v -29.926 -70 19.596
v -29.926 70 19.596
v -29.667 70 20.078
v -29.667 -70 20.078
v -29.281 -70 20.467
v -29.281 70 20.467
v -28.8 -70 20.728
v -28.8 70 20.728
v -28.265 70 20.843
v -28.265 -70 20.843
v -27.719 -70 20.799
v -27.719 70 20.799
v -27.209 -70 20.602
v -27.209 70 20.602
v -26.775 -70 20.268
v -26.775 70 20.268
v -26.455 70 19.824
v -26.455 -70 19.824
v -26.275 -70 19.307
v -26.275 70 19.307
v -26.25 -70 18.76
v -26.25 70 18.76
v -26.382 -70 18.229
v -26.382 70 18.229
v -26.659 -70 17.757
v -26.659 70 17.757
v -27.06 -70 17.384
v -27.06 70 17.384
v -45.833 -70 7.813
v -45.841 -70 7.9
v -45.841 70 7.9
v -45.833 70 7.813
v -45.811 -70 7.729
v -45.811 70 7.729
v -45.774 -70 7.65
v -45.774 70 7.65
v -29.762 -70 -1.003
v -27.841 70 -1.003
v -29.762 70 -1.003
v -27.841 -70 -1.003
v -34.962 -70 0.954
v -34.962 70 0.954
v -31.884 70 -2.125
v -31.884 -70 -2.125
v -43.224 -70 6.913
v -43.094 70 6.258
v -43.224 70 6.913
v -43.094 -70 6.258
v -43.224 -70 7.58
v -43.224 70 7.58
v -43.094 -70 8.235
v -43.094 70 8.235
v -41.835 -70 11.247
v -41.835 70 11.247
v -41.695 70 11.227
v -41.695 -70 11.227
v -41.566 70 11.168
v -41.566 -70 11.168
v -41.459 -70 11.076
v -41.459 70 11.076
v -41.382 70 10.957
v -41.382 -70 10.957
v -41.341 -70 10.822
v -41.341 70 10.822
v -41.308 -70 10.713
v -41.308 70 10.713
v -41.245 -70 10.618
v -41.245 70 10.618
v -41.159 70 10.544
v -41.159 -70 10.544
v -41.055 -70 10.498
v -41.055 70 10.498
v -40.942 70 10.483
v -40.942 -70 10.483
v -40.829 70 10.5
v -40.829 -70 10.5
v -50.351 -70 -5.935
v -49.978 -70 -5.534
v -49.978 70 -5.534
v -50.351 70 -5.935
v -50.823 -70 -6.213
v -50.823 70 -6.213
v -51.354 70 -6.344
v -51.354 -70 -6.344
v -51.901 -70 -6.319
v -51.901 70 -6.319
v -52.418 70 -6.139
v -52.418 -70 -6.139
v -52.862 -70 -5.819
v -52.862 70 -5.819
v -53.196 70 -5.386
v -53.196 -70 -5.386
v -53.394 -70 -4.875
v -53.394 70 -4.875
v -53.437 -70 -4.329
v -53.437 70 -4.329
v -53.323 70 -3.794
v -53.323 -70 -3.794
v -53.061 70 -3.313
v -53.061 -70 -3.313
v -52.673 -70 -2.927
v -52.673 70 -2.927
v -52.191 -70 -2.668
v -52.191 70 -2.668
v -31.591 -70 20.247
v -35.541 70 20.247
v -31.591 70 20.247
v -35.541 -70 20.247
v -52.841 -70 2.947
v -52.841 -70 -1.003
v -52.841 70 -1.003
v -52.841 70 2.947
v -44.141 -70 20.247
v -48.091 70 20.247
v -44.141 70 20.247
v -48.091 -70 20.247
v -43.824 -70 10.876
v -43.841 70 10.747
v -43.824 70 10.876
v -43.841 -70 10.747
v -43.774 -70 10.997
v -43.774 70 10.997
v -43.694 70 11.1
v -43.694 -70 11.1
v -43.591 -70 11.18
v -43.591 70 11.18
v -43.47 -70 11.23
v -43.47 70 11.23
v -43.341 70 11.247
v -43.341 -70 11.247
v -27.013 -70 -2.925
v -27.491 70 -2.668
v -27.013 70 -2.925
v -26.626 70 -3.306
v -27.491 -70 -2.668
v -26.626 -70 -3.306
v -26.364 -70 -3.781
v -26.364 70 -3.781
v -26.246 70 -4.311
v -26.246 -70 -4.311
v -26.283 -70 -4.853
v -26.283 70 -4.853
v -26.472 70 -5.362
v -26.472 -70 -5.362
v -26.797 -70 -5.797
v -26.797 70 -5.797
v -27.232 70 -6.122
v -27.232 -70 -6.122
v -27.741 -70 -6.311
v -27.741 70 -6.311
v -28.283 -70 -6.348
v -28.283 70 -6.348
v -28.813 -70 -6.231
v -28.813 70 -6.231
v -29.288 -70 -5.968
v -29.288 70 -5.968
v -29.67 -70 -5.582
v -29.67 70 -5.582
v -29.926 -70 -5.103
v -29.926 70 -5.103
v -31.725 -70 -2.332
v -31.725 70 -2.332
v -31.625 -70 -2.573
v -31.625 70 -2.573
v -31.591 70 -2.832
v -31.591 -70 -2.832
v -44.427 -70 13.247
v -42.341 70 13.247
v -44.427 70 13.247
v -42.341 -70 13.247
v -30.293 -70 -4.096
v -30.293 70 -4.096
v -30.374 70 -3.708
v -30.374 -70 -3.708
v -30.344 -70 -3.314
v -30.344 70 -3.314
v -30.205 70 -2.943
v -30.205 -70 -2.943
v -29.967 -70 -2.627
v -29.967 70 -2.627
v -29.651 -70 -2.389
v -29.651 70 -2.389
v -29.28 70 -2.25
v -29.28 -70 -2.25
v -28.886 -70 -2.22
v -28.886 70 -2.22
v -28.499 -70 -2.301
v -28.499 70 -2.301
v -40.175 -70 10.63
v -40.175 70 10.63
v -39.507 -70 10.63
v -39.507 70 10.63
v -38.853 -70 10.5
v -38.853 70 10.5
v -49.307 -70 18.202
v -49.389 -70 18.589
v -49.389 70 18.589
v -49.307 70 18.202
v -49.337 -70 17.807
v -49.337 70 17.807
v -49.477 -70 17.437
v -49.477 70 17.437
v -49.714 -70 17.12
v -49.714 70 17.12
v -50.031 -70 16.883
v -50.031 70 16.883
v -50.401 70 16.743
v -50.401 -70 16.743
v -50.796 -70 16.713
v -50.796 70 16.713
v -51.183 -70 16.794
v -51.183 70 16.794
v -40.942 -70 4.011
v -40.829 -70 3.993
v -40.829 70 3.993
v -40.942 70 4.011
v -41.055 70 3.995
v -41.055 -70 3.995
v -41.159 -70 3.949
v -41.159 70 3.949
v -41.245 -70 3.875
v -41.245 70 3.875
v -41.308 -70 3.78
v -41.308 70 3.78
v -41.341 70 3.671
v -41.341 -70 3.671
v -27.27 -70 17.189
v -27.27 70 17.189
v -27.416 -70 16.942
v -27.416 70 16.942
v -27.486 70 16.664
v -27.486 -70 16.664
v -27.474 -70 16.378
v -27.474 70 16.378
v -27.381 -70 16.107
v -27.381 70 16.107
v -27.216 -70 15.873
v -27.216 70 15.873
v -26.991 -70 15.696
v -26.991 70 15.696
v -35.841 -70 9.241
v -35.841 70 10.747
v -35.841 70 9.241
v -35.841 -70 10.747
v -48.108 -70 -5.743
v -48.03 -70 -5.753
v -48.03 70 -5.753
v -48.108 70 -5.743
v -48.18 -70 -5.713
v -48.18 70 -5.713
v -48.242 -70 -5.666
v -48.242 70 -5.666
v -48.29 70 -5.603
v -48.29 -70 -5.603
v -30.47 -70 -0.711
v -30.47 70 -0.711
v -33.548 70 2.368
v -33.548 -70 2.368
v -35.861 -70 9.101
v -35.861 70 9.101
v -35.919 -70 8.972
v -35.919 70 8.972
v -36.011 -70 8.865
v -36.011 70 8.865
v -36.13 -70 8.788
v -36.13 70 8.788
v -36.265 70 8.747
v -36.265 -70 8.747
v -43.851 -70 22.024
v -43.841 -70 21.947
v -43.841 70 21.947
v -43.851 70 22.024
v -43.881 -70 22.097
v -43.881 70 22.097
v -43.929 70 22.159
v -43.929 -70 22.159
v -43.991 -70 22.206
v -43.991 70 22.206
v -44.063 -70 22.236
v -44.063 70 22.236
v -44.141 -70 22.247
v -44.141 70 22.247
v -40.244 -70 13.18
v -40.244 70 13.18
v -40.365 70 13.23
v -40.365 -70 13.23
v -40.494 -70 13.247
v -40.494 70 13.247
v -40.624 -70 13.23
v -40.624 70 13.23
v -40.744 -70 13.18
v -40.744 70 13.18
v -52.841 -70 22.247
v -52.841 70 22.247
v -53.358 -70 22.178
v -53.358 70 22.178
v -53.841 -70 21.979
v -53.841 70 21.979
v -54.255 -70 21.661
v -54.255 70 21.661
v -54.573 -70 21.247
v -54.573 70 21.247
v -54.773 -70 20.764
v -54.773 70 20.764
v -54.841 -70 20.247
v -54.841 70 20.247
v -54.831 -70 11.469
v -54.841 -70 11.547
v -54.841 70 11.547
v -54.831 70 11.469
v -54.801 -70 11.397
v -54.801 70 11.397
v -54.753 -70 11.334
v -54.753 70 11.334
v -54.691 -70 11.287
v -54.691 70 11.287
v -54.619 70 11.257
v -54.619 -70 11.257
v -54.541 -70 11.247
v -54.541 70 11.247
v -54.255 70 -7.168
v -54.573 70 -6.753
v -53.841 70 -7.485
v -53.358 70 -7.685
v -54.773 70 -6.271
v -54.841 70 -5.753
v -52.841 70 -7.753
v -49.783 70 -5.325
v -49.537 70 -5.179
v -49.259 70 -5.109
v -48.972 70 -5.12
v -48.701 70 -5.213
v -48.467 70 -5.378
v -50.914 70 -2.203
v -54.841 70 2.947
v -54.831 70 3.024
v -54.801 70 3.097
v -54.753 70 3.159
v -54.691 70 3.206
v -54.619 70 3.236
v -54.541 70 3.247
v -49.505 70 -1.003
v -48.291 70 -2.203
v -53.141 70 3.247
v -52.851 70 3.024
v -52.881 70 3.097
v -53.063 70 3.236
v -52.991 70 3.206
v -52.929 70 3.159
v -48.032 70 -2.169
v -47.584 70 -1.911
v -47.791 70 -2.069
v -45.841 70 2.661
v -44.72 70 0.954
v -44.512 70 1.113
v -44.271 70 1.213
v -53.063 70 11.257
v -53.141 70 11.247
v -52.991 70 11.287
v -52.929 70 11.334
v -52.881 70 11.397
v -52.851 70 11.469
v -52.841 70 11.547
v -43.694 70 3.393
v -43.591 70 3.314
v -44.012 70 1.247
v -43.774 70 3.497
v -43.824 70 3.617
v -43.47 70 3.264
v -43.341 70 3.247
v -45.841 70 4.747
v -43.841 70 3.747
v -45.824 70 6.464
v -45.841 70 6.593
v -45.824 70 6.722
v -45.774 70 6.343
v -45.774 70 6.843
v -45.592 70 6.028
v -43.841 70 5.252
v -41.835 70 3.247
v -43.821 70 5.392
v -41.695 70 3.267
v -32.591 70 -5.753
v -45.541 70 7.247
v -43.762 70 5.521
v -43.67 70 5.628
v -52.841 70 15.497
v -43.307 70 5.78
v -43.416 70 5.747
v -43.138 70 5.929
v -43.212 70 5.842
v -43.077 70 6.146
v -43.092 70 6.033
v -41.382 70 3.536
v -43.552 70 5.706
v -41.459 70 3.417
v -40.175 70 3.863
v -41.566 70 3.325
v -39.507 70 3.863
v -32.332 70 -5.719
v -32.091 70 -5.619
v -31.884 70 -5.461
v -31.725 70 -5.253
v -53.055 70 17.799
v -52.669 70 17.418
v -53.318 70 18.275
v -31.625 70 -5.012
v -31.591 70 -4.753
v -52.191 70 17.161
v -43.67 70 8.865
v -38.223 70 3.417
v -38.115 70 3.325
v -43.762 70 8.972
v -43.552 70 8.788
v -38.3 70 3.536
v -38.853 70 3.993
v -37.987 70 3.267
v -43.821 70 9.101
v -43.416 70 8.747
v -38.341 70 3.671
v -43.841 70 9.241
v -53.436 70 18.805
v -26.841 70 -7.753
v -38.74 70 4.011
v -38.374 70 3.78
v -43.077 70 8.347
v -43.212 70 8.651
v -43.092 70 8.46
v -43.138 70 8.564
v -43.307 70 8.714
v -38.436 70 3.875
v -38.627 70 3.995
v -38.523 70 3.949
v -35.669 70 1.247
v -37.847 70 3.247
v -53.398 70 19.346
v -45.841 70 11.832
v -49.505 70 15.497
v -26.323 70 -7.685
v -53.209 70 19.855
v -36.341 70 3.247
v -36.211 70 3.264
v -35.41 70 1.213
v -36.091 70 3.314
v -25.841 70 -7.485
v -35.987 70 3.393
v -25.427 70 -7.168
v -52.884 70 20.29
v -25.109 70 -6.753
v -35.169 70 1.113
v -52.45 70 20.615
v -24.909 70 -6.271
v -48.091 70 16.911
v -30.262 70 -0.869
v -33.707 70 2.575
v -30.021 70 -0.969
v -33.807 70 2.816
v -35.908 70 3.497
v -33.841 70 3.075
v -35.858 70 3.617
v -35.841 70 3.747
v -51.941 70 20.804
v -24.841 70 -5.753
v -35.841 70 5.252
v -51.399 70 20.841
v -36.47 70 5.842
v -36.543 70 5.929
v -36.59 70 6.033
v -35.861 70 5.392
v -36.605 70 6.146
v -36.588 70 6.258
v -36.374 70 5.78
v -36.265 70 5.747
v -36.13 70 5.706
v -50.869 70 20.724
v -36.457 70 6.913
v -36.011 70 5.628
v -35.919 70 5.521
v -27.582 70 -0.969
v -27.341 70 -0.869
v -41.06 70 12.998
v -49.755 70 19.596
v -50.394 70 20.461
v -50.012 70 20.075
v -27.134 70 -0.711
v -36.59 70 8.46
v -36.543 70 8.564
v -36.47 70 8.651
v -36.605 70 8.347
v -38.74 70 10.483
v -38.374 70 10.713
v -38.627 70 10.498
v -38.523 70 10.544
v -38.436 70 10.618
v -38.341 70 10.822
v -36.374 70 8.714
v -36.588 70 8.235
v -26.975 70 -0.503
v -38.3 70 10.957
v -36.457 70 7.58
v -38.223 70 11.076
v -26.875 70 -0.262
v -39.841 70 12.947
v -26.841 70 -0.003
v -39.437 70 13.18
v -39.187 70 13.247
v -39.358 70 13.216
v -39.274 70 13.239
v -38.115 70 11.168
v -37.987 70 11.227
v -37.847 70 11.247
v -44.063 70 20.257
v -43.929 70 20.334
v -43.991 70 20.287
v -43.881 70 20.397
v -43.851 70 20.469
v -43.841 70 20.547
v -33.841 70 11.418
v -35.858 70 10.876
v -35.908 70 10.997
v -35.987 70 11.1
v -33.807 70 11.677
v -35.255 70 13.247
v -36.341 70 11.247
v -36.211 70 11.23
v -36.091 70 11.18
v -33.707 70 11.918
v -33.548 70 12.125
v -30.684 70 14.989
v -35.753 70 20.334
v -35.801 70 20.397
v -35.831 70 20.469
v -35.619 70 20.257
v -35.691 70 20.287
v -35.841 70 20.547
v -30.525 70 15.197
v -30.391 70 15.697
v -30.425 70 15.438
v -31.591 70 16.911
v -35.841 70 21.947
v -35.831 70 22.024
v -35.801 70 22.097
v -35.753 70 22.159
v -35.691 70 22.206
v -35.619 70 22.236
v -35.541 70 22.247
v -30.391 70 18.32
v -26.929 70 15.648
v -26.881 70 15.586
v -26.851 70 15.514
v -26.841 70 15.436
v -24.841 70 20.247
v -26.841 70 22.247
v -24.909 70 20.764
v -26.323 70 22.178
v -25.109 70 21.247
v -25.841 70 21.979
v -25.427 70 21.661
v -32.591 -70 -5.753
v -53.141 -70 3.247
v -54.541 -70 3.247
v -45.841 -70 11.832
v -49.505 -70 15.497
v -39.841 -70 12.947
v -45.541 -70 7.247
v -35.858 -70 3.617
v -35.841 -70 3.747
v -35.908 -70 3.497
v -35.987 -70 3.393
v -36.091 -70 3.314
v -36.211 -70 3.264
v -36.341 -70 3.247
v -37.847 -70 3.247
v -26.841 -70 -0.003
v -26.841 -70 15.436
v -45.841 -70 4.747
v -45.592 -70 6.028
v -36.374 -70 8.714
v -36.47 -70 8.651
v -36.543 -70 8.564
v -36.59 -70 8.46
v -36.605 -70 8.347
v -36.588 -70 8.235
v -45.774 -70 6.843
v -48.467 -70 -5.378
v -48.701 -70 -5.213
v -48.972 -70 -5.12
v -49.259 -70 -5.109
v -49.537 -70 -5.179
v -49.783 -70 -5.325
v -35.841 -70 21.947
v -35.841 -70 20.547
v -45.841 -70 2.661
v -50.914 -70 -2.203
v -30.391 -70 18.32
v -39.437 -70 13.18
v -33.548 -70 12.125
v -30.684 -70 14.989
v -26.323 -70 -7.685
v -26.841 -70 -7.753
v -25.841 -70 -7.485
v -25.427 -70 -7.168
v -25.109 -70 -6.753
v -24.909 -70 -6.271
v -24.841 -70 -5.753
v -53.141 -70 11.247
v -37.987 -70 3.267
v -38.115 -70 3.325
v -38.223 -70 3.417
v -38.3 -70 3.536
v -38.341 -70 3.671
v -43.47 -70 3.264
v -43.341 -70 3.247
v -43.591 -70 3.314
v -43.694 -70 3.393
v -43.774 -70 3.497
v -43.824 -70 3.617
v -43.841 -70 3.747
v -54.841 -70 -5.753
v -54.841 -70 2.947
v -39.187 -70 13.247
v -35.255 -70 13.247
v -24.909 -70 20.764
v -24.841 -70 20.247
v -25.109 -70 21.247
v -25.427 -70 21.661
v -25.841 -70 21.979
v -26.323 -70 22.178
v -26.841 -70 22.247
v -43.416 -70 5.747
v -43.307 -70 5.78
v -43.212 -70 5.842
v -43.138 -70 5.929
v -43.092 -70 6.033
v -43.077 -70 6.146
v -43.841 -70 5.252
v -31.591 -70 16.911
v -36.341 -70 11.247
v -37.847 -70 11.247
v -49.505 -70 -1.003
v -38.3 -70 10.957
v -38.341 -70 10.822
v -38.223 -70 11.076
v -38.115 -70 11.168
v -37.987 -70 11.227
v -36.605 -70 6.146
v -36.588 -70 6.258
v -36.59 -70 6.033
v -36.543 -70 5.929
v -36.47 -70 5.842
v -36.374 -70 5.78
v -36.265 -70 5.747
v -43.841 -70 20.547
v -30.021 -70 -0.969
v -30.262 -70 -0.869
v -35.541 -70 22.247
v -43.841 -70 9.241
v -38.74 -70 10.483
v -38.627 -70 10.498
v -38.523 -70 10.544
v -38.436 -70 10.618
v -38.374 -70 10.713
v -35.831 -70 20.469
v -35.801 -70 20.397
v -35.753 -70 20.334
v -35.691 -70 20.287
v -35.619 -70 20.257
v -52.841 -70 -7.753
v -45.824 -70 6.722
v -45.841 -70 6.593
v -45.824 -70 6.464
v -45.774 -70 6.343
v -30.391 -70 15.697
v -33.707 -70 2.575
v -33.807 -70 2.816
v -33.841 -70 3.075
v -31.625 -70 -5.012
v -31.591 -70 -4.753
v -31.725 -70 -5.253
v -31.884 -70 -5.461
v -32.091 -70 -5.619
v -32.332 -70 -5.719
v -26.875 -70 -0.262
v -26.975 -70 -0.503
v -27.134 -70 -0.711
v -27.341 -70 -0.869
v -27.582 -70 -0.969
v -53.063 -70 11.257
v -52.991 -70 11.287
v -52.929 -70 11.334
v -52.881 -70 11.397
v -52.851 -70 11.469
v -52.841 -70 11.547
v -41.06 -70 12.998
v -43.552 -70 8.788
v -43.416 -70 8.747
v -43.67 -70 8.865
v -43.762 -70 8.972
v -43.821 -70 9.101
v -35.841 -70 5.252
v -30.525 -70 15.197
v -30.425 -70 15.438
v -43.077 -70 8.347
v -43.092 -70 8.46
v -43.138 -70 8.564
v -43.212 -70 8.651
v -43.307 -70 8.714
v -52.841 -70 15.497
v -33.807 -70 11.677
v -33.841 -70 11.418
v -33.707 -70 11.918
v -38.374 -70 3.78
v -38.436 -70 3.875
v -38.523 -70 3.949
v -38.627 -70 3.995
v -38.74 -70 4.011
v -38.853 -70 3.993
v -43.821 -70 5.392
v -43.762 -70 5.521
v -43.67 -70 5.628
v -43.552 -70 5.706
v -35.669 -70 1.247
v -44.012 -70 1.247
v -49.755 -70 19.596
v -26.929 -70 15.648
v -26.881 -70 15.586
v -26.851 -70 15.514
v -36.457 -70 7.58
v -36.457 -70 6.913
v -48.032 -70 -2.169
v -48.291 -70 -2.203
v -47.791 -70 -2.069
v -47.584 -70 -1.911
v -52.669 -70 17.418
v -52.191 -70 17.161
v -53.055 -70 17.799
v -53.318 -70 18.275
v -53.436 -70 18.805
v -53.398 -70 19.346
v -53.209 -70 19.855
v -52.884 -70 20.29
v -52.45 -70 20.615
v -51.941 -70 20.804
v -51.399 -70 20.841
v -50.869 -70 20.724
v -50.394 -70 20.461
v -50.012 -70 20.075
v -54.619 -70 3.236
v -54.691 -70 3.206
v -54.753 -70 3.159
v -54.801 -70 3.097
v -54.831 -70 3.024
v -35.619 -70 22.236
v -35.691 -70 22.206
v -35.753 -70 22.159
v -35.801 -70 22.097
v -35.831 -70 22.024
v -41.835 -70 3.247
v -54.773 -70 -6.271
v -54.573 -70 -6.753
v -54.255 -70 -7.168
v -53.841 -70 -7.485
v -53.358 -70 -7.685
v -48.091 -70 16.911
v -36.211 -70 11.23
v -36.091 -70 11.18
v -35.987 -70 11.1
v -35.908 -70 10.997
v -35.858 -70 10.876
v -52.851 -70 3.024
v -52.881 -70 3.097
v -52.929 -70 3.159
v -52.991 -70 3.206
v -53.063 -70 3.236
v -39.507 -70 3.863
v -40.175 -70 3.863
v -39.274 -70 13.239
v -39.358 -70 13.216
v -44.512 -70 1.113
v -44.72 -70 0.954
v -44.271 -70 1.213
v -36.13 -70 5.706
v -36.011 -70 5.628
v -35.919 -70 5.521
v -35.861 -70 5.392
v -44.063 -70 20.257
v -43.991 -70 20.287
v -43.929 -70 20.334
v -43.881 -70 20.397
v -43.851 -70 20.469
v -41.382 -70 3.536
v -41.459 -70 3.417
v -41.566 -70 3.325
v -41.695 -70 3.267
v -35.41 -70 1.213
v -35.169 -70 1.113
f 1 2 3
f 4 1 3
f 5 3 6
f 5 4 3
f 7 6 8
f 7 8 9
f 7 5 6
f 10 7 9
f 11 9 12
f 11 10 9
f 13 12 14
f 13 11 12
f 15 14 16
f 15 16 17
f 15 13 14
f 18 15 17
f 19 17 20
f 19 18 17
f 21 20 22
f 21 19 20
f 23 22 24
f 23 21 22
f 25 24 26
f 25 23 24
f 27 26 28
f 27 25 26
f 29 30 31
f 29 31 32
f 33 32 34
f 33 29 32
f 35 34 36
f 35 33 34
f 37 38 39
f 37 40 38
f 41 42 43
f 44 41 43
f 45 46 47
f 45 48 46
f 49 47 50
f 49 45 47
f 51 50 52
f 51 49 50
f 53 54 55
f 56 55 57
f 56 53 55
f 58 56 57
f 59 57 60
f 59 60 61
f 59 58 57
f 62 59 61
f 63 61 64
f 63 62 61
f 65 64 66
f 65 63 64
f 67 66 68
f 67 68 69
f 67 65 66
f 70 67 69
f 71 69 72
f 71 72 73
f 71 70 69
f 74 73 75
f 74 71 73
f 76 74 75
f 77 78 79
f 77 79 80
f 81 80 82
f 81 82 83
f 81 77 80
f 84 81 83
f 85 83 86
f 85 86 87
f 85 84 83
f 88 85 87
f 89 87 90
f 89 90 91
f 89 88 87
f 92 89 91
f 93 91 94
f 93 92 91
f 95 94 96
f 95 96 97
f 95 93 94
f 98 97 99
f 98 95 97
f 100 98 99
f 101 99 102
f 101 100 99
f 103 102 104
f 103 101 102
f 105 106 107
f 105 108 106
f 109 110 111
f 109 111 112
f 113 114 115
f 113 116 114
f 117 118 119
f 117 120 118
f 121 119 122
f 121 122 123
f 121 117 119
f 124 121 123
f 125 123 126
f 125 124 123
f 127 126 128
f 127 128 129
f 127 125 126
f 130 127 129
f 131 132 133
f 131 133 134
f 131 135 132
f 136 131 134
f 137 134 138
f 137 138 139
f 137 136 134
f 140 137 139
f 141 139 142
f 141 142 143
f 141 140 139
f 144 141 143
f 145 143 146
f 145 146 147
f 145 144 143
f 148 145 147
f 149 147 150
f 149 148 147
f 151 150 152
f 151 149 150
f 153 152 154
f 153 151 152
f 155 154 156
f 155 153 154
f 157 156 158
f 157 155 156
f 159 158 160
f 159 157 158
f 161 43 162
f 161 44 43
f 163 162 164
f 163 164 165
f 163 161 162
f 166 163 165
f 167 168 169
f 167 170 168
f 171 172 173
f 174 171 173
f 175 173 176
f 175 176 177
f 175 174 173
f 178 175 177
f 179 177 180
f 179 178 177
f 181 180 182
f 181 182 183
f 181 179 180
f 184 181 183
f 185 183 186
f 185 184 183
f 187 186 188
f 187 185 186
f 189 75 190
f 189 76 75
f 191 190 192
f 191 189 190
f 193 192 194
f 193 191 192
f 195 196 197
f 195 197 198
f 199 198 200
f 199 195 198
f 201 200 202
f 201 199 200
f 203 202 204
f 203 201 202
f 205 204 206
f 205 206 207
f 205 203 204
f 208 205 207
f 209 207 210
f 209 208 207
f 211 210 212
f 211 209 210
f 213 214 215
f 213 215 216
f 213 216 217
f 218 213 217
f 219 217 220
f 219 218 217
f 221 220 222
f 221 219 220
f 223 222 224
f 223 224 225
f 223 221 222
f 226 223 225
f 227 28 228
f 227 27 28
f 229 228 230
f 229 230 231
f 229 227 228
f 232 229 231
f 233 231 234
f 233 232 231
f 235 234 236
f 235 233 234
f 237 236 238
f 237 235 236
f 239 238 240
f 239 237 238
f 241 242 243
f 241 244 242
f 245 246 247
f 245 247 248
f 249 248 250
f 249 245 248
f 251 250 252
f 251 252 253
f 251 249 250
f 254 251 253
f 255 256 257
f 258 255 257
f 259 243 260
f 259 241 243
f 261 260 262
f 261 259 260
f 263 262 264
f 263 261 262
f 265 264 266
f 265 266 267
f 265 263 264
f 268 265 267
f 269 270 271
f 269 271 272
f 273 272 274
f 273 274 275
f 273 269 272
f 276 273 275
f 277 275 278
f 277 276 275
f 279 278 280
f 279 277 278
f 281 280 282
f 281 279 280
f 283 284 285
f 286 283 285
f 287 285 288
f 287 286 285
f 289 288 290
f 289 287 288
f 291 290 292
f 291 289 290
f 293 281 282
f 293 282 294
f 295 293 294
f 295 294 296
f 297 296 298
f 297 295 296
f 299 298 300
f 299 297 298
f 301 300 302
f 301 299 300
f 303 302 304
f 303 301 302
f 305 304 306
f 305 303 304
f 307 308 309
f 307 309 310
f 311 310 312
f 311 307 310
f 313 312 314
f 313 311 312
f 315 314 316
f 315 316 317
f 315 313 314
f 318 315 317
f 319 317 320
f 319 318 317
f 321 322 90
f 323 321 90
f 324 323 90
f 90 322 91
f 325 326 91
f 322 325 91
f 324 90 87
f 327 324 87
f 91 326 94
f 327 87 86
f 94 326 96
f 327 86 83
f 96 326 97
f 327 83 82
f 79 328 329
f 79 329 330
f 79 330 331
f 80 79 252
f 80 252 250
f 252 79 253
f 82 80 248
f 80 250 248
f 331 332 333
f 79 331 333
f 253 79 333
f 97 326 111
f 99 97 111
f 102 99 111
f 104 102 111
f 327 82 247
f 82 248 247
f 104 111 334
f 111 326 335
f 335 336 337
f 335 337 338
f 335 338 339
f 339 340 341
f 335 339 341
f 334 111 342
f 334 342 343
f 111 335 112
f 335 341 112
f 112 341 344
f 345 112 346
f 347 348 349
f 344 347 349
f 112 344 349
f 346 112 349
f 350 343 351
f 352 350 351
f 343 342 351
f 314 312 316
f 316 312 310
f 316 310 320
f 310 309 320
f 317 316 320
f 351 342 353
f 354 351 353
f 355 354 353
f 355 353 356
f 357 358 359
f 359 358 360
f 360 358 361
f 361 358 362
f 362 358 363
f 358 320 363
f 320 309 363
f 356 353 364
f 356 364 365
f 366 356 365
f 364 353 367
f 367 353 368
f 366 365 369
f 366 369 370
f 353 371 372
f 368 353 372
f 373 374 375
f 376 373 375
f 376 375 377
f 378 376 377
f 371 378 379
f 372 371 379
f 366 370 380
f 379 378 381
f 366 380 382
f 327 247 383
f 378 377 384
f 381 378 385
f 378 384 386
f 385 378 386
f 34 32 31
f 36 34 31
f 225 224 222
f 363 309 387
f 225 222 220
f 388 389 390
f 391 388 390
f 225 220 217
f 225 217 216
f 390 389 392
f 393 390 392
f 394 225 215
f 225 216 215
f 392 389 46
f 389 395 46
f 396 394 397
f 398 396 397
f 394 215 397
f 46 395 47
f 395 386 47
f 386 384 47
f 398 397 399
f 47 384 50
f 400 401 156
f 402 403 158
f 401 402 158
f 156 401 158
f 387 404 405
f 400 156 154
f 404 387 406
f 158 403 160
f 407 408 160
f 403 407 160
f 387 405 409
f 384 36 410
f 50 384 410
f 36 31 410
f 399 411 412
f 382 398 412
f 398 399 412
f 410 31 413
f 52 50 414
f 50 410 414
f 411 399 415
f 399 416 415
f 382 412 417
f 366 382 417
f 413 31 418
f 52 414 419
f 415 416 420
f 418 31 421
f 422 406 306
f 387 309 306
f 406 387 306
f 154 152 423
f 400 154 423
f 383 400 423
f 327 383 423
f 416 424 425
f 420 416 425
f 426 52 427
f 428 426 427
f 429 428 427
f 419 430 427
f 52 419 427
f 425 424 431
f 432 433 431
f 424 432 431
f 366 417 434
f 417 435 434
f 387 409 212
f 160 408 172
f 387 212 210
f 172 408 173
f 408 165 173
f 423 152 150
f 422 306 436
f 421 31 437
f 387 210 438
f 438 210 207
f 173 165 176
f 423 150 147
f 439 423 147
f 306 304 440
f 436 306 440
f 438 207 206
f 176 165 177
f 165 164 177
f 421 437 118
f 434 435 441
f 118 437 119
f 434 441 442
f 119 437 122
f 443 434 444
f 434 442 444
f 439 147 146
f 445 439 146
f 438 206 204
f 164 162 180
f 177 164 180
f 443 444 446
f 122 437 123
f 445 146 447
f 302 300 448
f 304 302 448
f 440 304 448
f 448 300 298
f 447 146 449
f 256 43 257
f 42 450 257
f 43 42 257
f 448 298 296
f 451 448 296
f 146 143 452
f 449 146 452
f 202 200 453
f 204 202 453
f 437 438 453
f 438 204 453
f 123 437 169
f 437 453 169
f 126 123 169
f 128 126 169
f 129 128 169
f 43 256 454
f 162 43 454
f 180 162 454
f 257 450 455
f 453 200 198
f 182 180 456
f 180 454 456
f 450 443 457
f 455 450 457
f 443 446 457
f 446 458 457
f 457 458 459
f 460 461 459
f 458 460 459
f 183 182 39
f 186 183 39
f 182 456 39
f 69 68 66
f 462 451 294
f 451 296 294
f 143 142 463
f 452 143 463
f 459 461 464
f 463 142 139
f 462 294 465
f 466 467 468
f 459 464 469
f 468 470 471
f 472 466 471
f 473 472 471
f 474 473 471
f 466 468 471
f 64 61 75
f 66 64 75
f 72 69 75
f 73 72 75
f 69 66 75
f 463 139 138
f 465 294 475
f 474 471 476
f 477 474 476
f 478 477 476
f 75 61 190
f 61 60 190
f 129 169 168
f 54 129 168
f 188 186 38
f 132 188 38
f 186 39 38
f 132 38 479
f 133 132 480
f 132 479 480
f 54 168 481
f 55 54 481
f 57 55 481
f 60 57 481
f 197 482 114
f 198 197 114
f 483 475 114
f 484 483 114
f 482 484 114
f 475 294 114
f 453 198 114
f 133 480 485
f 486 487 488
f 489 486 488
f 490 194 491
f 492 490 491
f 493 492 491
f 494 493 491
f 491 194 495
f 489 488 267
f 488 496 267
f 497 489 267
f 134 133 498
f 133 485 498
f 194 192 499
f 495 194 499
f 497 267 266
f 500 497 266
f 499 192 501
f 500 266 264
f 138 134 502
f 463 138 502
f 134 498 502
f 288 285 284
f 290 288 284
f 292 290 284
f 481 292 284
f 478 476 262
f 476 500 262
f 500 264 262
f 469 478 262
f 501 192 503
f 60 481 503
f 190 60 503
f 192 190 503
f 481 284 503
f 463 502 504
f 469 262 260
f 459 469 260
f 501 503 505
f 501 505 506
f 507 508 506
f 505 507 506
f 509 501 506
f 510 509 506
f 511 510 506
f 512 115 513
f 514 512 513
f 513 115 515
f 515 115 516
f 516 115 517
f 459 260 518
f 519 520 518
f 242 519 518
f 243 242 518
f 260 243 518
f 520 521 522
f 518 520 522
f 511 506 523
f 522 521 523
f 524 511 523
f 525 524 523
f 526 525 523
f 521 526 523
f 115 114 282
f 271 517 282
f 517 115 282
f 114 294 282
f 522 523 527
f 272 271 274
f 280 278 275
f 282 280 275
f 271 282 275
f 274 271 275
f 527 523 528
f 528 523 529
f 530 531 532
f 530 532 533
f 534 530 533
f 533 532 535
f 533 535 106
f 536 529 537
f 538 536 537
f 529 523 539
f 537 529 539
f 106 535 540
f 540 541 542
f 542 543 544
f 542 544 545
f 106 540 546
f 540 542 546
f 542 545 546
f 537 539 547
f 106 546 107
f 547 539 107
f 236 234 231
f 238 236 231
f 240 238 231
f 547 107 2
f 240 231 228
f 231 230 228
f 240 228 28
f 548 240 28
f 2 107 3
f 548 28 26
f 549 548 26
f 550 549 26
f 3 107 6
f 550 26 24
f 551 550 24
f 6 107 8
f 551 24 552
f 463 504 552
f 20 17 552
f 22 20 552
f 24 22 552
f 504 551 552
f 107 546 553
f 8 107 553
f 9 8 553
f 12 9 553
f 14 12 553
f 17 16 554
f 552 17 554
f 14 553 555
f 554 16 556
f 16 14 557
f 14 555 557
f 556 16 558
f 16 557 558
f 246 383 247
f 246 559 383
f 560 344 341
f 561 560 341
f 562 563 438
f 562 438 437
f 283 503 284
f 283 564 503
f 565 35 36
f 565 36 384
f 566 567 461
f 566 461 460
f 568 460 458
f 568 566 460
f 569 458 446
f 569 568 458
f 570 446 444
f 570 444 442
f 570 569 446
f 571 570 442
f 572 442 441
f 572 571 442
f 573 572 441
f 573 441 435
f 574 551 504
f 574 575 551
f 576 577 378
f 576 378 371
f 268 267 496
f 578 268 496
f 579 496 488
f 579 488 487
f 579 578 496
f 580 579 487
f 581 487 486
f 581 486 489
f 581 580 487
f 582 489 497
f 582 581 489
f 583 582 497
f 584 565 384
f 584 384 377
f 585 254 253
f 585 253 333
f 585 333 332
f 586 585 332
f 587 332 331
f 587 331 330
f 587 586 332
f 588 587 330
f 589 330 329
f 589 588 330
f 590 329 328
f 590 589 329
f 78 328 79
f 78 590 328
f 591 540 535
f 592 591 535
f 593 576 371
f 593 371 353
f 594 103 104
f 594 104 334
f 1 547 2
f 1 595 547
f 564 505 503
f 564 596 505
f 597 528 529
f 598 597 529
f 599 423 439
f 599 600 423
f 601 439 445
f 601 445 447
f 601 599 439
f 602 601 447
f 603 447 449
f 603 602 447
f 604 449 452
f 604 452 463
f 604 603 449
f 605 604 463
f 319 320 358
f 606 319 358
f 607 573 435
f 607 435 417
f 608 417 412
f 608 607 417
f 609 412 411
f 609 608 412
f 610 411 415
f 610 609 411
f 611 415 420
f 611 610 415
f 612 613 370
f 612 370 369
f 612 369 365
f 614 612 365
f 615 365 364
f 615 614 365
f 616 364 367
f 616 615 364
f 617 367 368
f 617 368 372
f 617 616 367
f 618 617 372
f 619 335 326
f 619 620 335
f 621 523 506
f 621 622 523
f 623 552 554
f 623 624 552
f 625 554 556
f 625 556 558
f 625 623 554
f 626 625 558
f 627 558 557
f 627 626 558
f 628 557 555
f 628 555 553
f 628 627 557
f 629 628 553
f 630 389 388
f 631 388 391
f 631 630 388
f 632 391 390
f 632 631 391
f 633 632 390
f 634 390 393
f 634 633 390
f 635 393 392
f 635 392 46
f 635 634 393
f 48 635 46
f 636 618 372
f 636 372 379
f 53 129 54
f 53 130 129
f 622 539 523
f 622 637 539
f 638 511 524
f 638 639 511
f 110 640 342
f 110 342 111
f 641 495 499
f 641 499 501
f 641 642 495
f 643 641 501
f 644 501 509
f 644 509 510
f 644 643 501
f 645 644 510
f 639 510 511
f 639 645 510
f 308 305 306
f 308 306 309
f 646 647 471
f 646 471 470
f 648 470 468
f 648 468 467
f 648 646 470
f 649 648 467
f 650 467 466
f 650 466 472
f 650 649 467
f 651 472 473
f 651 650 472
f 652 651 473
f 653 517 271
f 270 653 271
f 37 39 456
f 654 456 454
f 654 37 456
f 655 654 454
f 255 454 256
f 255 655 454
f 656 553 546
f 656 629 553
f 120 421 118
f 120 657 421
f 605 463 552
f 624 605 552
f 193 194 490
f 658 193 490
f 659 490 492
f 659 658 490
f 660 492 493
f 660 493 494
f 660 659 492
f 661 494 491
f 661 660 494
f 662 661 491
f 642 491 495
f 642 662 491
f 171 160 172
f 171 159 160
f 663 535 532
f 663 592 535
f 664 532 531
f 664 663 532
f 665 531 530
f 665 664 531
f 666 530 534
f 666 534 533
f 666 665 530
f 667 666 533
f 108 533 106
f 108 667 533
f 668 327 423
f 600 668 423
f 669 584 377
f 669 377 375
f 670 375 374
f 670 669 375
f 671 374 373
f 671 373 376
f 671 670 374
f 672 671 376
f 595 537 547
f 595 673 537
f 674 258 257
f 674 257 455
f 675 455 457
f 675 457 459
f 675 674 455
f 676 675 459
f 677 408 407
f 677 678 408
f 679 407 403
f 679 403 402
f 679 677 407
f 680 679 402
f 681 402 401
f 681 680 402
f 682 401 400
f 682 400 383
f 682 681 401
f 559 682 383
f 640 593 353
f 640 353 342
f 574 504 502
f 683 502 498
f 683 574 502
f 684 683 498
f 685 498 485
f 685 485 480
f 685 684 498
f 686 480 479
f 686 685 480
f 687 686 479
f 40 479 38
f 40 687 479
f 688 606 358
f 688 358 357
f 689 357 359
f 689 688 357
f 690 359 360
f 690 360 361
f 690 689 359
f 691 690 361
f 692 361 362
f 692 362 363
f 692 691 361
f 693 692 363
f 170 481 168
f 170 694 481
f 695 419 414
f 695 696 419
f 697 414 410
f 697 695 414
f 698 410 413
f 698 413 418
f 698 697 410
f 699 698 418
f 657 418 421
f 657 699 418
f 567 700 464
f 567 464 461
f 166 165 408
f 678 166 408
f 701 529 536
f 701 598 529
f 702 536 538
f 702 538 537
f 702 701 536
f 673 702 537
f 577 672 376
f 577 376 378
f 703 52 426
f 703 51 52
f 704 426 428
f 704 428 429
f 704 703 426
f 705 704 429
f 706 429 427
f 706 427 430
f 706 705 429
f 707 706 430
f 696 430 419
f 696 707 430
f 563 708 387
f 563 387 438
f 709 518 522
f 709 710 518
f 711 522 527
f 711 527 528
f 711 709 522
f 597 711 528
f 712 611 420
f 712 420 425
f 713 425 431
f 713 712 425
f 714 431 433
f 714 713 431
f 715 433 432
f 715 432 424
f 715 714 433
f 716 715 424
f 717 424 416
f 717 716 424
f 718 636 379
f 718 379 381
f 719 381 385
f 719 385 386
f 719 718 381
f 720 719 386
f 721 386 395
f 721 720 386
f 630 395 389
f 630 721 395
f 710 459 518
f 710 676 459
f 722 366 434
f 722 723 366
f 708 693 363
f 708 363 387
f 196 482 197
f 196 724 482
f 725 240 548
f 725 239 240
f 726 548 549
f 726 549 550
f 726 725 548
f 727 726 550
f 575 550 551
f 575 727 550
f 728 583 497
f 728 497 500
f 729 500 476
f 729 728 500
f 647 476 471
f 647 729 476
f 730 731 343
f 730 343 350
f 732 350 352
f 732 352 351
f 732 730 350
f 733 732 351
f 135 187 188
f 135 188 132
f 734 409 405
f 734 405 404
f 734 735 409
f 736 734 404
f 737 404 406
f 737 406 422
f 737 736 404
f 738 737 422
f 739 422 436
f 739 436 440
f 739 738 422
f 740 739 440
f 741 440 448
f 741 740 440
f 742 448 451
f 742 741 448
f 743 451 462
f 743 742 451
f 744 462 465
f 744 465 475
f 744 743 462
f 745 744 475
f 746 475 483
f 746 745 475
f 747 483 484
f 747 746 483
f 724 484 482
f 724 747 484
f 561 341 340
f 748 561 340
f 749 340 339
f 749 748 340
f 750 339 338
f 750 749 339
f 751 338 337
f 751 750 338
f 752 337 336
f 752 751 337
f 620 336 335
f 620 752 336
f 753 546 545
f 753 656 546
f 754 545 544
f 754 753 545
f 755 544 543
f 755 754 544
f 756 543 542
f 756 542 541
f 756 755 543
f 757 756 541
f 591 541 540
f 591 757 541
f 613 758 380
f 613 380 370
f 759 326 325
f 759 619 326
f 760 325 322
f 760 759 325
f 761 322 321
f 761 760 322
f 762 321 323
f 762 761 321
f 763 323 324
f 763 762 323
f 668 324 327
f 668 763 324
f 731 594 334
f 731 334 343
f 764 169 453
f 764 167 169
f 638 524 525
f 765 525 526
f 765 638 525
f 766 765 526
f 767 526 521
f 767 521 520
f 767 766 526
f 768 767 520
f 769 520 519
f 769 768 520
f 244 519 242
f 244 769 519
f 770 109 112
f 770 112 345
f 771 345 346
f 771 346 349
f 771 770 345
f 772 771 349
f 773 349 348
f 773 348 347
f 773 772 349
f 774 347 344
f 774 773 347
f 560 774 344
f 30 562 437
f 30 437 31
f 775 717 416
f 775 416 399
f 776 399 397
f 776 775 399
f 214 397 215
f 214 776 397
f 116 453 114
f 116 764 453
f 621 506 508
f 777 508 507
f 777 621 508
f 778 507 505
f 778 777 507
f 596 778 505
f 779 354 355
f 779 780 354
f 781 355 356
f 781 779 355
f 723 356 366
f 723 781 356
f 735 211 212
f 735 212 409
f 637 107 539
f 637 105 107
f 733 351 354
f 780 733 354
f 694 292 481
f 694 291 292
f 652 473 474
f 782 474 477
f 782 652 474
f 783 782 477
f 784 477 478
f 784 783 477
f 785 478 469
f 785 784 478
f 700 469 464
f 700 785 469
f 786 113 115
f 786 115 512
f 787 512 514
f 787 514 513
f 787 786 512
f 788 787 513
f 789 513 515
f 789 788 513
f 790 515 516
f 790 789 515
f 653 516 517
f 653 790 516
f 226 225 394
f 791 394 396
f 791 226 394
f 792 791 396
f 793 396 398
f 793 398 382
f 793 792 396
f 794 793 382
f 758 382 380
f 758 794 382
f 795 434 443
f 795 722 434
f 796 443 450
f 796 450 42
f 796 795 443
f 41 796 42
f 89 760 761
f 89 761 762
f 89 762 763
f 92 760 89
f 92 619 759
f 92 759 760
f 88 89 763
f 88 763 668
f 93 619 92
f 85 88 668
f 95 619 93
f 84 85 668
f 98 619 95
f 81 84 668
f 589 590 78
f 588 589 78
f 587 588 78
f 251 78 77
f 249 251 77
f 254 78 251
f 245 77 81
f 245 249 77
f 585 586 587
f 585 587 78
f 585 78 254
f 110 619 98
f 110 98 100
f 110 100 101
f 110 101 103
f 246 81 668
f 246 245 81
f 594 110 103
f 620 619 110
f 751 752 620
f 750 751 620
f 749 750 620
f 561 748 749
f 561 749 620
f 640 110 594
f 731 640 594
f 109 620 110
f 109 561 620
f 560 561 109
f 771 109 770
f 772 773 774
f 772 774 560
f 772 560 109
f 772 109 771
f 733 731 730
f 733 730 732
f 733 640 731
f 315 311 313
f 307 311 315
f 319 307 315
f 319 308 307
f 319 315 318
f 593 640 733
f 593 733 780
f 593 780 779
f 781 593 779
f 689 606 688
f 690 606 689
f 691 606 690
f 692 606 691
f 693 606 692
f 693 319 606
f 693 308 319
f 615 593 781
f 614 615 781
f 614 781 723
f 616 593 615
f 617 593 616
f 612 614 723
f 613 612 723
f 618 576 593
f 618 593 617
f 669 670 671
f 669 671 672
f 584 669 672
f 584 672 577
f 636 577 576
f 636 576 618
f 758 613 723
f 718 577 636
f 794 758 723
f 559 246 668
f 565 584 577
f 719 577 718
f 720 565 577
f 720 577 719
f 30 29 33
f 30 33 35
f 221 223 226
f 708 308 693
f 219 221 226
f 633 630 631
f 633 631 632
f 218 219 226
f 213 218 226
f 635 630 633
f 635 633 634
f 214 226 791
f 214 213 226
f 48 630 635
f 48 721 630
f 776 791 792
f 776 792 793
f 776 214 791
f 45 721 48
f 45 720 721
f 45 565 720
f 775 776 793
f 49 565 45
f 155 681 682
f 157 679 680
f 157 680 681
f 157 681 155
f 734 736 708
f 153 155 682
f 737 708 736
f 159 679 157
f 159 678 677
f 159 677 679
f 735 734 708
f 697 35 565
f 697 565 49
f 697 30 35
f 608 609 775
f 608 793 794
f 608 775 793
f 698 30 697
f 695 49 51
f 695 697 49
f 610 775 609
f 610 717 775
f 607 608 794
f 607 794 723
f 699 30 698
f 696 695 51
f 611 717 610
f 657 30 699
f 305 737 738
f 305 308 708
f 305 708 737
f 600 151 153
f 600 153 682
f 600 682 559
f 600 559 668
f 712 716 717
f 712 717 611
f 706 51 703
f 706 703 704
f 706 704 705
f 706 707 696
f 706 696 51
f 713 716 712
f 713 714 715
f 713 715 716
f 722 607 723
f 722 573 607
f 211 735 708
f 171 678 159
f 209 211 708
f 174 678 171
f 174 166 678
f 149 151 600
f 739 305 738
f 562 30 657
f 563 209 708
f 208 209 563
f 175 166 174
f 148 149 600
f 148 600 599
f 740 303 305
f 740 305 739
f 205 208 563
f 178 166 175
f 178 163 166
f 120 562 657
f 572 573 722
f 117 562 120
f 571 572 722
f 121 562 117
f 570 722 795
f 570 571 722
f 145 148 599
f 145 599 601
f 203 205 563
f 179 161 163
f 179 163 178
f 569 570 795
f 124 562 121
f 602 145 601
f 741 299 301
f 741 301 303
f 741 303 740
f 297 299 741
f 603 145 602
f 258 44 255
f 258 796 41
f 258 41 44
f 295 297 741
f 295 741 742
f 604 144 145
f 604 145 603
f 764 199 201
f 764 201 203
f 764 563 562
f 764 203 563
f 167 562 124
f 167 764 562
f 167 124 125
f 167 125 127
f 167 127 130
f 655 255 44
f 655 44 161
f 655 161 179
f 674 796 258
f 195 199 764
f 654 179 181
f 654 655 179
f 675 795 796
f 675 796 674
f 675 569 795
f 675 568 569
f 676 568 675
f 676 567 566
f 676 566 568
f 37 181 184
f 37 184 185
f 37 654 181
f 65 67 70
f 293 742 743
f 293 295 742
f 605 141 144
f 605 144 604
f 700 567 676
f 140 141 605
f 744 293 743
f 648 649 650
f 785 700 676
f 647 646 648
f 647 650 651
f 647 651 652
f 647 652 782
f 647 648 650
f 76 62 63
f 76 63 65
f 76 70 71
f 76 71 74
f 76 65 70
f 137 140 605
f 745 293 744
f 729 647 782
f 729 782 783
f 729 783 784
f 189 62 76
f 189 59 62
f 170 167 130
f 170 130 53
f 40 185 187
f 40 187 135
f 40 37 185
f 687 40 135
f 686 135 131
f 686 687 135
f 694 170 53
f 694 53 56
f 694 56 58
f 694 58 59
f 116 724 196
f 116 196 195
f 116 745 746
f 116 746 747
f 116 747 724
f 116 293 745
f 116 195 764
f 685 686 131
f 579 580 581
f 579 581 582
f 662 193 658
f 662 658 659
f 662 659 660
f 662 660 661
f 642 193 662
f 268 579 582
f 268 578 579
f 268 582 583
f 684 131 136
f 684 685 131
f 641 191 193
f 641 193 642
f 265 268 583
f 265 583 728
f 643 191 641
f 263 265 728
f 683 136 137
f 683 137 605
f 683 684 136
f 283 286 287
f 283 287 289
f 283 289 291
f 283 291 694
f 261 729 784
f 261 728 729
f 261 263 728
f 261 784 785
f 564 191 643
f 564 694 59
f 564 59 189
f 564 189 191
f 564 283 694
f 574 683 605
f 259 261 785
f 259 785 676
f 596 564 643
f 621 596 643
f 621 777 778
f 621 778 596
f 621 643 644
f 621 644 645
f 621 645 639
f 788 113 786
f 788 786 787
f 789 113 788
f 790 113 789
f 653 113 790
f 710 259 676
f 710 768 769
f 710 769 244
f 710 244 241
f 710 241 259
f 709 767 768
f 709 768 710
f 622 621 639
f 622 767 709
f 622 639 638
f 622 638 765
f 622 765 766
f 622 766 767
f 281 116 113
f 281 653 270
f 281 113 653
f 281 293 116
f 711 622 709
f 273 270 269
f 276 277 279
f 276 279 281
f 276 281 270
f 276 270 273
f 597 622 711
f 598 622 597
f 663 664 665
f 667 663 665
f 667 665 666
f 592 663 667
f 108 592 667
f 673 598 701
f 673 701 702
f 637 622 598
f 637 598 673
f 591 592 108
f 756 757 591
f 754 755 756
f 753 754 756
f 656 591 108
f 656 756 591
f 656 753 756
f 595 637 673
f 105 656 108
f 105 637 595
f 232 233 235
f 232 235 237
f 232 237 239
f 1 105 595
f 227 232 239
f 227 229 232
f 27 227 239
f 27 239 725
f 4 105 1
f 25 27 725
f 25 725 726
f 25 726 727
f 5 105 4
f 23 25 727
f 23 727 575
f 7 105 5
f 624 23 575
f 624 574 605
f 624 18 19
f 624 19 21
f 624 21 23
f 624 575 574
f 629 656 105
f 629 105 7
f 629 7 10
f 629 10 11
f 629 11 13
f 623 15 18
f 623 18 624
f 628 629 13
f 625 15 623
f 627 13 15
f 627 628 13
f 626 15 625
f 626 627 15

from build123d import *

# Parameters (mm, degrees)
F2_DEPTH = 70


# Not quite as in the source:
# - ends of sketch curves that miss each other by under 0.0002 mm in the source are joined


with BuildPart() as f2:
    # F1 (on Front) → F2 (new body, symmetric)
    with BuildSketch(Plane.XZ):
        with BuildLine():
            Line((-48.090856, 20.246586), (-44.140856, 20.246586))
            ThreePointArc((-44.140856, 20.246586), (-43.9287239656, 20.3344539656), (-43.840856, 20.546586))
            Line((-43.840856, 20.546586), (-43.840856, 21.946586))
            ThreePointArc((-43.840856, 21.946586), (-43.9287239656, 22.1587180344), (-44.140856, 22.246586))
            Line((-44.140856, 22.246586), (-52.840856, 22.246586))
            ThreePointArc((-52.840856, 22.246586), (-54.2550695624, 21.6607995624), (-54.840856, 20.246586))
            Line((-54.840856, 20.246586), (-54.840856, 11.546586))
            ThreePointArc((-54.840856, 11.546586), (-54.7529880344, 11.3344539656), (-54.540856, 11.246586))
            Line((-54.540856, 11.246586), (-53.140856, 11.246586))
            ThreePointArc((-53.140856, 11.246586), (-52.9287239656, 11.3344539656), (-52.840856, 11.546586))
            Line((-52.840856, 11.546586), (-52.840856, 15.496586))
            Line((-52.840856, 15.496586), (-49.50507, 15.496586))
            Line((-49.50507, 15.496586), (-45.840856, 11.832372))
            Line((-45.840856, 11.832372), (-45.840856, 7.900176))
            ThreePointArc((-45.840856, 7.900176), (-45.8238189324, 7.7707665494), (-45.7738687764, 7.6501761291))
            Line((-45.7738687764, 7.6501761291), (-45.540856, 7.246586))
            Line((-45.540856, 7.246586), (-45.773869, 6.842996))
            ThreePointArc((-45.773869, 6.842996), (-45.840856, 6.592996), (-45.7738687764, 6.3429961291))
            Line((-45.7738687764, 6.3429961291), (-45.591833, 6.0277))
            Line((-45.591833, 6.0277), (-45.840856, 4.746586))
            Line((-45.840856, 4.746586), (-45.840856, 2.6608))
            Line((-45.840856, 2.6608), (-49.50507, -1.003414))
            Line((-49.50507, -1.003414), (-52.840856, -1.003414))
            Line((-52.840856, -1.003414), (-52.840856, 2.946586))
            ThreePointArc((-52.840856, 2.946586), (-52.9287239656, 3.1587180344), (-53.140856, 3.246586))
            Line((-53.140856, 3.246586), (-54.540856, 3.246586))
            ThreePointArc((-54.540856, 3.246586), (-54.7529880344, 3.1587180344), (-54.840856, 2.946586))
            Line((-54.840856, 2.946586), (-54.840856, -5.753414))
            ThreePointArc((-54.840856, -5.753414), (-54.2550695624, -7.1676275624), (-52.840856, -7.753414))
            Line((-52.840856, -7.753414), (-26.840856, -7.753414))
            ThreePointArc((-26.840856, -7.753414), (-25.4266424376, -7.1676275624), (-24.840856, -5.753414))
            Line((-24.840856, -5.753414), (-24.840856, 20.246586))
            ThreePointArc((-24.840856, 20.246586), (-25.4266424376, 21.6607995624), (-26.840856, 22.246586))
            Line((-26.840856, 22.246586), (-35.540856, 22.246586))
            ThreePointArc((-35.540856, 22.246586), (-35.7529880344, 22.1587180344), (-35.840856, 21.946586))
            Line((-35.840856, 21.946586), (-35.840856, 20.546586))
            ThreePointArc((-35.840856, 20.546586), (-35.7529880344, 20.3344539656), (-35.540856, 20.246586))
            Line((-35.540856, 20.246586), (-31.590856, 20.246586))
            Line((-31.590856, 20.246586), (-31.590856, 16.9108))
            Line((-31.590856, 16.9108), (-35.25507, 13.246586))
            Line((-35.25507, 13.246586), (-39.187266, 13.246586))
            ThreePointArc((-39.187266, 13.246586), (-39.3166754506, 13.2295489324), (-39.4372658709, 13.1795987764))
            Line((-39.4372658709, 13.1795987764), (-39.840856, 12.946586))
            Line((-39.840856, 12.946586), (-40.244446, 13.179599))
            ThreePointArc((-40.244446, 13.179599), (-40.494446, 13.246586), (-40.7444458709, 13.1795987764))
            Line((-40.7444458709, 13.1795987764), (-41.059742, 12.997563))
            Line((-41.059742, 12.997563), (-42.340856, 13.246586))
            Line((-42.340856, 13.246586), (-44.426642, 13.246586))
            Line((-44.426642, 13.246586), (-48.090856, 16.9108))
            Line((-48.090856, 16.9108), (-48.090856, 20.246586))
        make_face()
        with BuildLine():
            ThreePointArc((-48.030175, -5.753414), (-48.180175082, -5.7132215738), (-48.2899827159, -5.6034138359))
            ThreePointArc((-48.2899827159, -5.6034138359), (-49.1151948384, -5.1042472042), (-49.9783690315, -5.5344479782))
            ThreePointArc((-49.9783690315, -5.5344479782), (-53.0449723505, -5.6142903949), (-52.1906940253, -2.6679979306))
            Line((-52.1906940253, -2.6679979306), (-50.91426, -2.203414))
            Line((-50.91426, -2.203414), (-48.290856, -2.203414))
            ThreePointArc((-48.290856, -2.203414), (-47.9081725676, -2.1272935325), (-47.5837492188, -1.9105207812))
            Line((-47.5837492188, -1.9105207812), (-44.719536, 0.953693))
            ThreePointArc((-44.719536, 0.953693), (-44.3951124324, 1.1704655325), (-44.012429, 1.246586))
            Line((-44.012429, 1.246586), (-35.669283, 1.246586))
            ThreePointArc((-35.669283, 1.246586), (-35.2865995676, 1.1704655325), (-34.9621762188, 0.9536927812))
            Line((-34.9621762188, 0.9536927812), (-31.883749, -2.124734))
            ThreePointArc((-31.883749, -2.124734), (-31.6669764675, -2.4491575676), (-31.590856, -2.831841))
            Line((-31.590856, -2.831841), (-31.590856, -4.753414))
            ThreePointArc((-31.590856, -4.753414), (-31.8837492188, -5.4605207812), (-32.590856, -5.753414))
            Line((-32.590856, -5.753414), (-48.030175, -5.753414))
        make_face(mode=Mode.SUBTRACT)
        with BuildLine():
            ThreePointArc((-30.2930043339, -4.0956641215), (-29.9673844937, -2.6268855063), (-28.4986058785, -2.3012656661))
            Line((-28.4986058785, -2.3012656661), (-27.491018, -2.667998))
            ThreePointArc((-27.491018, -2.667998), (-26.7973531157, -5.7969168843), (-29.9262720694, -5.1032520253))
            Line((-29.9262720694, -5.1032520253), (-30.2930043339, -4.0956641215))
        make_face(mode=Mode.SUBTRACT)
        with BuildLine():
            ThreePointArc((-36.5876690145, 8.2349049956), (-36.440856, 7.246586), (-36.5876690145, 6.2582670044))
            ThreePointArc((-36.5876690145, 6.2582670044), (-36.5433888407, 5.9288023569), (-36.2653470651, 5.7465855742))
            ThreePointArc((-36.2653470651, 5.7465855742), (-35.9615444769, 5.5780848975), (-35.840856, 5.25232))
            Line((-35.840856, 5.25232), (-35.840856, 3.746586))
            ThreePointArc((-35.840856, 3.746586), (-35.9873026094, 3.3930326094), (-36.340856, 3.246586))
            Line((-36.340856, 3.246586), (-37.84659, 3.246586))
            ThreePointArc((-37.84659, 3.246586), (-38.1723548975, 3.3672744769), (-38.3408555178, 3.6710770737))
            ThreePointArc((-38.3408555178, 3.6710770737), (-38.5230723569, 3.9491188407), (-38.8525409519, 3.9933978415))
            ThreePointArc((-38.8525409519, 3.9933978415), (-39.840856, 3.846586), (-40.8291749956, 3.9933990145))
            ThreePointArc((-40.8291749956, 3.9933990145), (-41.1586396431, 3.9491188407), (-41.3408564258, 3.6710770651))
            ThreePointArc((-41.3408564258, 3.6710770651), (-41.5093571025, 3.3672744769), (-41.835122, 3.246586))
            Line((-41.835122, 3.246586), (-43.340856, 3.246586))
            ThreePointArc((-43.340856, 3.246586), (-43.6944093906, 3.3930326094), (-43.840856, 3.746586))
            Line((-43.840856, 3.746586), (-43.840856, 5.25232))
            ThreePointArc((-43.840856, 5.25232), (-43.7201675231, 5.5780848975), (-43.4163649263, 5.7465855178))
            ThreePointArc((-43.4163649263, 5.7465855178), (-43.1383231593, 5.9288023569), (-43.0940441585, 6.2582709519))
            ThreePointArc((-43.0940441585, 6.2582709519), (-43.240856, 7.246586), (-43.0940429855, 8.2349049956))
            ThreePointArc((-43.0940429855, 8.2349049956), (-43.1383231593, 8.5643696431), (-43.4163649349, 8.7465864258))
            ThreePointArc((-43.4163649349, 8.7465864258), (-43.7201675231, 8.9150871025), (-43.840856, 9.240852))
            Line((-43.840856, 9.240852), (-43.840856, 10.746586))
            ThreePointArc((-43.840856, 10.746586), (-43.6944093906, 11.1001393906), (-43.340856, 11.246586))
            Line((-43.340856, 11.246586), (-41.835122, 11.246586))
            ThreePointArc((-41.835122, 11.246586), (-41.5093571025, 11.1258975231), (-41.3408564822, 10.8220949263))
            ThreePointArc((-41.3408564822, 10.8220949263), (-41.1586396431, 10.5440531593), (-40.8291710481, 10.4997741585))
            ThreePointArc((-40.8291710481, 10.4997741585), (-39.840856, 10.646586), (-38.8525370044, 10.4997729855))
            ThreePointArc((-38.8525370044, 10.4997729855), (-38.5230723569, 10.5440531593), (-38.3408555742, 10.8220949349))
            ThreePointArc((-38.3408555742, 10.8220949349), (-38.1723548975, 11.1258975231), (-37.84659, 11.246586))
            Line((-37.84659, 11.246586), (-36.340856, 11.246586))
            ThreePointArc((-36.340856, 11.246586), (-35.9873026094, 11.1001393906), (-35.840856, 10.746586))
            Line((-35.840856, 10.746586), (-35.840856, 9.240852))
            ThreePointArc((-35.840856, 9.240852), (-35.9615444769, 8.9150871025), (-36.2653470737, 8.7465864822))
            ThreePointArc((-36.2653470737, 8.7465864822), (-36.5433888407, 8.5643696431), (-36.5876690145, 8.2349049956))
        make_face(mode=Mode.SUBTRACT)
        with BuildLine():
            ThreePointArc((-49.3887076661, 18.5888361215), (-49.7143275063, 17.1200575063), (-51.1831061215, 16.7944376661))
            Line((-51.1831061215, 16.7944376661), (-52.190694, 17.16117))
            ThreePointArc((-52.190694, 17.16117), (-52.8843588843, 20.2900888843), (-49.7554399306, 19.5964240253))
            Line((-49.7554399306, 19.5964240253), (-49.3887076661, 18.5888361215))
        make_face(mode=Mode.SUBTRACT)
        with BuildLine():
            ThreePointArc((-33.5479627812, 2.3679062188), (-33.7647355325, 2.6923295676), (-33.840856, 3.075013))
            Line((-33.840856, 3.075013), (-33.840856, 11.418159))
            ThreePointArc((-33.840856, 11.418159), (-33.7647355325, 11.8008424324), (-33.5479627812, 12.1252657812))
            Line((-33.5479627812, 12.1252657812), (-30.683749, 14.989479))
            ThreePointArc((-30.683749, 14.989479), (-30.4669764675, 15.3139025676), (-30.390856, 15.696586))
            Line((-30.390856, 15.696586), (-30.390856, 18.31999))
            Line((-30.390856, 18.31999), (-29.926272, 19.596424))
            ThreePointArc((-29.926272, 19.596424), (-26.9799796051, 20.4507023505), (-27.0598220201, 17.3840990291))
            ThreePointArc((-27.0598220201, 17.3840990291), (-27.4900227958, 16.5209248384), (-26.9908561748, 15.6957126972))
            ThreePointArc((-26.9908561748, 15.6957126972), (-26.8810484262, 15.585905082), (-26.840856, 15.435905))
            Line((-26.840856, 15.435905), (-26.840856, -0.003414))
            ThreePointArc((-26.840856, -0.003414), (-27.1337492188, -0.7105207812), (-27.840856, -1.003414))
            Line((-27.840856, -1.003414), (-29.762429, -1.003414))
            ThreePointArc((-29.762429, -1.003414), (-30.1451124324, -0.9272935325), (-30.4695357812, -0.7105207812))
            Line((-30.4695357812, -0.7105207812), (-33.5479627812, 2.3679062188))
        make_face(mode=Mode.SUBTRACT)
    extrude(amount=F2_DEPTH, both=True)


solid = f2.part
